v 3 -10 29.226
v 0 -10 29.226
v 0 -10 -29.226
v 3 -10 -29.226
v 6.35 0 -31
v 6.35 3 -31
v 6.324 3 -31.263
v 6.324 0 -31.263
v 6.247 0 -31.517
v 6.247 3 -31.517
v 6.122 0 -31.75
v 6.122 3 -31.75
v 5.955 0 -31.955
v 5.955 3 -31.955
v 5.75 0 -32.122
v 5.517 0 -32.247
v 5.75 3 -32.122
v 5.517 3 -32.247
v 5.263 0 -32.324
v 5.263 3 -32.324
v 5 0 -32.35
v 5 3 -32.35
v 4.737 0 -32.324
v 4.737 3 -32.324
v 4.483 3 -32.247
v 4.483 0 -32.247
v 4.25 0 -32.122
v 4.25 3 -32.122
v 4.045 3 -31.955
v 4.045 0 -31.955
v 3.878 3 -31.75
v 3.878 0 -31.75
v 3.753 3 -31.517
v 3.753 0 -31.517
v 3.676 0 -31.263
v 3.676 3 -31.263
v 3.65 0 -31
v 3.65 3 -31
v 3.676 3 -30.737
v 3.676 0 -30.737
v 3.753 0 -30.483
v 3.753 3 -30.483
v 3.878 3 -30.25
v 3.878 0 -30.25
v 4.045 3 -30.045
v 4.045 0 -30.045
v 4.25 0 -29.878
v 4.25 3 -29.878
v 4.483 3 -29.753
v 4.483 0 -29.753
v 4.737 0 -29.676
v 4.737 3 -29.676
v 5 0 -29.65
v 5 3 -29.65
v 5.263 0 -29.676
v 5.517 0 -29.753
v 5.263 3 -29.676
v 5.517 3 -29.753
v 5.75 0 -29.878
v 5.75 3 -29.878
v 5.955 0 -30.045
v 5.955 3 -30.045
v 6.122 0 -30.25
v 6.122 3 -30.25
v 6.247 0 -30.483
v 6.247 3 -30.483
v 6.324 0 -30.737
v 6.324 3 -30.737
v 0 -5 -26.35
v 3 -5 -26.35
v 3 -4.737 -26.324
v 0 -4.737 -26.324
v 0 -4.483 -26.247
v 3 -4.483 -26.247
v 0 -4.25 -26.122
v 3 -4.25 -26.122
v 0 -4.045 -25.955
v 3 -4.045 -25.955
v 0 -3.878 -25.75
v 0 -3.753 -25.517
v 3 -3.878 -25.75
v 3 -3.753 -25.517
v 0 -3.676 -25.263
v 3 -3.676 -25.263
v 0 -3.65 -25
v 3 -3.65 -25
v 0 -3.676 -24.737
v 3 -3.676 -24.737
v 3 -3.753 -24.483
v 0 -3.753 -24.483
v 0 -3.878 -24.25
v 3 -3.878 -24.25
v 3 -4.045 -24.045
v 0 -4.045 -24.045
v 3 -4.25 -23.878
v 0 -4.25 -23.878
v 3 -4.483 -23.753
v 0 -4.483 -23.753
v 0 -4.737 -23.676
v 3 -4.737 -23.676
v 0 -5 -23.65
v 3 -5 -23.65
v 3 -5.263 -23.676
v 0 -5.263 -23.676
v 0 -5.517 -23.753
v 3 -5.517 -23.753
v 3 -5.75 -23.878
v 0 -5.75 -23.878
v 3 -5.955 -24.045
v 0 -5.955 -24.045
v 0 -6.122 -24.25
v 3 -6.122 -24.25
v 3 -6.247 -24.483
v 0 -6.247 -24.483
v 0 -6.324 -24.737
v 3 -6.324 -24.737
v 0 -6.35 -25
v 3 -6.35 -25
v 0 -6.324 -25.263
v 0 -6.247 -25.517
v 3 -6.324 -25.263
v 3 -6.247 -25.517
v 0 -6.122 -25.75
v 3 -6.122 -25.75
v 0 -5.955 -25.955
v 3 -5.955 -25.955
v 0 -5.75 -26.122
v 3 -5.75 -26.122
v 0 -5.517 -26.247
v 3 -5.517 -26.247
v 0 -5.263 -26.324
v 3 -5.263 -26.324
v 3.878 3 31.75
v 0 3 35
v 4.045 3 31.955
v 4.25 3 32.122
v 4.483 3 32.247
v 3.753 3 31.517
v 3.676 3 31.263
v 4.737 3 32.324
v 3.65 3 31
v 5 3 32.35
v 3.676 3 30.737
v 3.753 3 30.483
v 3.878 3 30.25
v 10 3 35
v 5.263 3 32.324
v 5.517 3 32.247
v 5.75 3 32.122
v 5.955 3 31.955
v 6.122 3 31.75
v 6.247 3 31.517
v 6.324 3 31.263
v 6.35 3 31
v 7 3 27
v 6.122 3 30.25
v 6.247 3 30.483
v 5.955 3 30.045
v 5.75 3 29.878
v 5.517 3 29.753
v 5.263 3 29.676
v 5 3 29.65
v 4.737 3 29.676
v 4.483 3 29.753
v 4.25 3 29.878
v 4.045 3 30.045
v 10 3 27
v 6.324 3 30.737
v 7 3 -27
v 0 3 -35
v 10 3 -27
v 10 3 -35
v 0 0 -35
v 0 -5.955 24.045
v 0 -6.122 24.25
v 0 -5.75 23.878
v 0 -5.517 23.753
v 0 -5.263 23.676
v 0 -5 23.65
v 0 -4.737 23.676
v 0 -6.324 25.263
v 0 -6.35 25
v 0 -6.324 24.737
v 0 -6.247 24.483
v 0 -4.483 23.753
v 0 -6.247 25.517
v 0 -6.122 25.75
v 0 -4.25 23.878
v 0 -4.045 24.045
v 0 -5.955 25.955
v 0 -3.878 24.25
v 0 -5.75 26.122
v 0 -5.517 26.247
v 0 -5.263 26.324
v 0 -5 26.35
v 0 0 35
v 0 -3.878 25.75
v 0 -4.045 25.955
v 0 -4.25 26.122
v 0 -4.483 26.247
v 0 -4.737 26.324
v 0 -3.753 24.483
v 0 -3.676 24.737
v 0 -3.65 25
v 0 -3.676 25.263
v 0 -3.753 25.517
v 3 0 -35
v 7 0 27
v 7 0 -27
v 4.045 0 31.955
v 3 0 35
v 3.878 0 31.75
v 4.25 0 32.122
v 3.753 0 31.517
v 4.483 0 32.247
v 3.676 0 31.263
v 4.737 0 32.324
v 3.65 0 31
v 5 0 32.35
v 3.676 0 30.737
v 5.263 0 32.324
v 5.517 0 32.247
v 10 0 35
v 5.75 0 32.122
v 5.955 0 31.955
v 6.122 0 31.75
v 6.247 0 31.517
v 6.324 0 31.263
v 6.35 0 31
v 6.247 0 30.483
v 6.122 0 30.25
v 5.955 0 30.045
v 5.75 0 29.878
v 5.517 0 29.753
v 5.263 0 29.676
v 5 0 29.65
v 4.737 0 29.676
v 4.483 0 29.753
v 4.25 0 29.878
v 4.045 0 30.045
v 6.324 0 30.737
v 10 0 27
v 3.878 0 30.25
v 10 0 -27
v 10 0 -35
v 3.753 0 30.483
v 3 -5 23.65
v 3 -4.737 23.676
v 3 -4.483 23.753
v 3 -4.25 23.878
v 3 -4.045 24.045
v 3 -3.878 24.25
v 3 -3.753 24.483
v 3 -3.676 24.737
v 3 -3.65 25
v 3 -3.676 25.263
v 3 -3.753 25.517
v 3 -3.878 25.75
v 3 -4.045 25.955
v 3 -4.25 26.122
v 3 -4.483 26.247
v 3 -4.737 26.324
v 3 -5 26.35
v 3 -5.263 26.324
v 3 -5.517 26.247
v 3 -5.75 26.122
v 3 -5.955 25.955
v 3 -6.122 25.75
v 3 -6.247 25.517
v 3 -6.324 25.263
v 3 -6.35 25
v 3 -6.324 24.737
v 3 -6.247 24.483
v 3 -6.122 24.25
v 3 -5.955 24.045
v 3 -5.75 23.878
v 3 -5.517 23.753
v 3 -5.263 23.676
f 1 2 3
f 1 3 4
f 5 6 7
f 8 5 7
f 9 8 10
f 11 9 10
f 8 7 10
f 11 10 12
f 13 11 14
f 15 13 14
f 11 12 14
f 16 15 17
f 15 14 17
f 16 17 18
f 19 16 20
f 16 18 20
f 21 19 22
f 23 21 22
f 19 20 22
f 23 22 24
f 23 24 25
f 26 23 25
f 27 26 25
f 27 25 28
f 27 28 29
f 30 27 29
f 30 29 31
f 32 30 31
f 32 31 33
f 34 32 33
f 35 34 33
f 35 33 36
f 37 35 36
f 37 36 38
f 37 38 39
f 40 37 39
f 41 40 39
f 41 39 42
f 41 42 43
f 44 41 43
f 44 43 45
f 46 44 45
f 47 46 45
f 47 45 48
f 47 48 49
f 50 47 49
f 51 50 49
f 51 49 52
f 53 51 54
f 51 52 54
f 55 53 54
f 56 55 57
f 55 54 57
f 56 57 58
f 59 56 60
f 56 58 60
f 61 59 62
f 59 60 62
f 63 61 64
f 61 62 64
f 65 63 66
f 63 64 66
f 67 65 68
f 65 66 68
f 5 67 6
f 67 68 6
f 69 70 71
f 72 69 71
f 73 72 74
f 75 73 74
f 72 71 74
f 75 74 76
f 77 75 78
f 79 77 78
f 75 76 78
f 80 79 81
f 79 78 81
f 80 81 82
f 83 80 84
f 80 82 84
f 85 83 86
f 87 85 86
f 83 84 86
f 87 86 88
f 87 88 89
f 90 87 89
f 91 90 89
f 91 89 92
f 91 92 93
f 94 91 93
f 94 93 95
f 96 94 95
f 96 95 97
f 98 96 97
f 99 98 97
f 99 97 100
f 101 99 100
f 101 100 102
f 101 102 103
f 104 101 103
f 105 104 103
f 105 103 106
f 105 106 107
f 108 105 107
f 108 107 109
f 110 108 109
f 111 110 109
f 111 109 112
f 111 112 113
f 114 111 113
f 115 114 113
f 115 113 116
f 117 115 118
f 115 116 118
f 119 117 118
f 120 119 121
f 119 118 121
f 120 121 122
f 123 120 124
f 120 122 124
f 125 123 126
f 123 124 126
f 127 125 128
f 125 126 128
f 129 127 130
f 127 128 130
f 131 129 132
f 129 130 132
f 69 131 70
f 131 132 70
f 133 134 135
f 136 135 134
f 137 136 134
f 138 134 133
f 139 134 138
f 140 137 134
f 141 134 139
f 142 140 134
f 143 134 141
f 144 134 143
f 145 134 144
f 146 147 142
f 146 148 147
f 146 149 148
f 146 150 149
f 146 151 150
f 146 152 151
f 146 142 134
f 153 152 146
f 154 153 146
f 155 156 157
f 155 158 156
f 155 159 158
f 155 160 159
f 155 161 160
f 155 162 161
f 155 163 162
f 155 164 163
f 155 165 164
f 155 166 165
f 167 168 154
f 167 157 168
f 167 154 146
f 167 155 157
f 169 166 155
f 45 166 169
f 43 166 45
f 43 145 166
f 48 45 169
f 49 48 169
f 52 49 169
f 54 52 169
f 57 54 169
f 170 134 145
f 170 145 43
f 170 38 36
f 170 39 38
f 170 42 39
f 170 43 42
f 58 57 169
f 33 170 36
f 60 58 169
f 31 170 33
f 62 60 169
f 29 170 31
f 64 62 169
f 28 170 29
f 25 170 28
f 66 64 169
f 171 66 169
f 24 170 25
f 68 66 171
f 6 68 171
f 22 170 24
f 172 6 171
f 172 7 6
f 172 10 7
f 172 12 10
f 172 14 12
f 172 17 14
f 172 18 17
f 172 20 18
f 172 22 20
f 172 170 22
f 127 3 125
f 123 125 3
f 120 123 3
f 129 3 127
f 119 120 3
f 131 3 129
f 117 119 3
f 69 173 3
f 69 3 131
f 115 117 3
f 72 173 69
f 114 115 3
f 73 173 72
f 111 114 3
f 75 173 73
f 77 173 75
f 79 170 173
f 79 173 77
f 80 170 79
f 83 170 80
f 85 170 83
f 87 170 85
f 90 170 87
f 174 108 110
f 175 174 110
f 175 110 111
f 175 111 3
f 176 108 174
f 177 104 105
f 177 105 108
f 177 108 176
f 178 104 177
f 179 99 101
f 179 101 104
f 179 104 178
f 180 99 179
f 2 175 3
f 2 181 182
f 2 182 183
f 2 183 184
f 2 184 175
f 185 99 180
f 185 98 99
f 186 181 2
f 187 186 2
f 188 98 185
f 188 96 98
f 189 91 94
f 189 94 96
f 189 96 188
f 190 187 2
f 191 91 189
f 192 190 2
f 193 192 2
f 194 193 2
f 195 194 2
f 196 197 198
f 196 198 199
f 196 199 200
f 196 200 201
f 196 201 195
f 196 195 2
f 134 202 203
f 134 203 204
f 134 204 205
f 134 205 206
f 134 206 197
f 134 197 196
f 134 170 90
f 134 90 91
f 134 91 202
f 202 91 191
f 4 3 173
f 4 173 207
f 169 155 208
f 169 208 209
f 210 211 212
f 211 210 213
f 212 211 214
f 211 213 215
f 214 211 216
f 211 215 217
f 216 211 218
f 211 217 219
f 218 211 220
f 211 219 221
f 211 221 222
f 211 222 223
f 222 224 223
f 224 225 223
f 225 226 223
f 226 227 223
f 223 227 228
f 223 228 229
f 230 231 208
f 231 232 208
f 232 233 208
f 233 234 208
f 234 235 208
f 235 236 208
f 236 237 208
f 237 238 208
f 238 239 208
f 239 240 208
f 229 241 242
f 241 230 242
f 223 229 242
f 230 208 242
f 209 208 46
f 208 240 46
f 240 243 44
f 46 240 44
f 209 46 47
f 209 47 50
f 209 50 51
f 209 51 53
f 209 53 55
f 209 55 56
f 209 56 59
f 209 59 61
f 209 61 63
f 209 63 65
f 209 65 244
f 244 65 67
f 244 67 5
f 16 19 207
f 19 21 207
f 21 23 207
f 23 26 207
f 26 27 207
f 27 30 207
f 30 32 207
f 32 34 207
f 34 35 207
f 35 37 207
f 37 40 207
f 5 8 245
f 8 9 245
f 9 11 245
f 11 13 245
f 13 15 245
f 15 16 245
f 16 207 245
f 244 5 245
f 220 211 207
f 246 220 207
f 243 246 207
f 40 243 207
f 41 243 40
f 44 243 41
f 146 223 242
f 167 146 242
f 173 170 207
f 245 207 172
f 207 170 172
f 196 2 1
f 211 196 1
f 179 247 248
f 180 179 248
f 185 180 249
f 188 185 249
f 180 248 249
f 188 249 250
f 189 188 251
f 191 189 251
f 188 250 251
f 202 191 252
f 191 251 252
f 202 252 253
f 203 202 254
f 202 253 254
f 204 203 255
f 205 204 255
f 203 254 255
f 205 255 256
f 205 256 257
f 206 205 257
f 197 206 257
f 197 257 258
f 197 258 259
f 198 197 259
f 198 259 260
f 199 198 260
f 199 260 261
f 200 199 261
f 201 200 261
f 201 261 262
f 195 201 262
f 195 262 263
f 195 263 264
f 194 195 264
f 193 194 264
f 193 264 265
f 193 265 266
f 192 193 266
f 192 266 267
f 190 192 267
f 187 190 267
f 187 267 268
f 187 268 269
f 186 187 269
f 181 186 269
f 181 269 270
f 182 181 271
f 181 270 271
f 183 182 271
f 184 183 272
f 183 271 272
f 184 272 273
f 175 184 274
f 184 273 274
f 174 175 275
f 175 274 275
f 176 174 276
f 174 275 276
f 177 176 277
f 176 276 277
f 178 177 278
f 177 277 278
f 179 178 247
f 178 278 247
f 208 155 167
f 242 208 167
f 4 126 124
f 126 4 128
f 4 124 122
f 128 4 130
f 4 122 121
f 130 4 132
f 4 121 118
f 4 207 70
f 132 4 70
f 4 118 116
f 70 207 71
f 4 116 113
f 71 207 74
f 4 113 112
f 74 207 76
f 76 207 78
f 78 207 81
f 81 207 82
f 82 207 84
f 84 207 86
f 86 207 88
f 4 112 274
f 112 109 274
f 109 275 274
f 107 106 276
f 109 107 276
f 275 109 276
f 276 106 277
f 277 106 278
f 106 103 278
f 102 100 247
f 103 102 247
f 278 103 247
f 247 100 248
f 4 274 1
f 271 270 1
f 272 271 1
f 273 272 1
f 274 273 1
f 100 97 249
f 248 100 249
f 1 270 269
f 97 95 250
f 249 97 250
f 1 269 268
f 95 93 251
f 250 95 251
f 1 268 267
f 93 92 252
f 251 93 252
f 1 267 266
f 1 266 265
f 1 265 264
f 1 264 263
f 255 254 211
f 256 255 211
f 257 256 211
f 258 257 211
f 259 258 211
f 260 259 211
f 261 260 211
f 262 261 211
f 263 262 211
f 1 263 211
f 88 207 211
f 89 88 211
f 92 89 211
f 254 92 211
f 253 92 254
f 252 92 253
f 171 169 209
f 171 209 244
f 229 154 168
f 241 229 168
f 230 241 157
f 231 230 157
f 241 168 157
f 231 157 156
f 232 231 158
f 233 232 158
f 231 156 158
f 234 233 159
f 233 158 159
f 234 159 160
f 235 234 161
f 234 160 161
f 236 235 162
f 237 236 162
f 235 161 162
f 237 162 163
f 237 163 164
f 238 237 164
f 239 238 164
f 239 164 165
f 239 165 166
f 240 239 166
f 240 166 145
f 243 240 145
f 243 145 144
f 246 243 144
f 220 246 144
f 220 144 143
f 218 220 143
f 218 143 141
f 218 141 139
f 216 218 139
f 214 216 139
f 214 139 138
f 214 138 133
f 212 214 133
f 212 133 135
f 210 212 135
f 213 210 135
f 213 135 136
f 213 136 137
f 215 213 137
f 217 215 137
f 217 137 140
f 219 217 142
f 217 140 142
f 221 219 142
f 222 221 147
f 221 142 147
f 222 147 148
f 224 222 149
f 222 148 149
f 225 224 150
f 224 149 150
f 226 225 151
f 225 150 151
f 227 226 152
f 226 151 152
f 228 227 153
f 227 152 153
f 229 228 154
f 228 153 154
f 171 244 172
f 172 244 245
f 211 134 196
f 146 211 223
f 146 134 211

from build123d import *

# Parameters (mm, degrees)
SKETCH1_W               = 10
SKETCH1_H               = 70
BOSS_EXTRUDE1_DEPTH     = 3
SKETCH2_W               = 3
SKETCH2_H               = 70
BOSS_EXTRUDE2_DEPTH     = 10
SKETCH3_R               = 1.35
CUT_EXTRUDE1_DEPTH      = 1
CUT_EXTRUDE1_DEPTH_BACK = 14
SKETCH4_R               = 1.35
CUT_EXTRUDE2_DEPTH      = 10
CHAMFER1_SIZE           = 10
CHAMFER1_SIZE2          = 5.773502692
CHAMFER1_PART_2_SIZE    = 10
CHAMFER1_PART_2_SIZE2   = 5.773502692
SKETCH5_W               = 3
SKETCH5_H               = 54
CUT_EXTRUDE3_DEPTH      = 10


with BuildPart() as part:
    # Sketch1 → Boss-Extrude1 (new body)
    with BuildSketch(Plane(origin=(0, 0, 0), x_dir=(1, 0, 0), z_dir=(0, 1, 0))):
        with Locations((5, 0)):
            Rectangle(SKETCH1_W, SKETCH1_H)
    extrude(amount=BOSS_EXTRUDE1_DEPTH)

    # Sketch2 → Boss-Extrude2 (add)
    with BuildSketch(Plane.XZ):
        with Locations((1.5, 0)):
            Rectangle(SKETCH2_W, SKETCH2_H)
    extrude(amount=BOSS_EXTRUDE2_DEPTH)

    # Sketch3 → Cut-Extrude1 (cut, two sides)
    with BuildSketch(Plane(origin=(0, 3, 0), x_dir=(1, 0, 0), z_dir=(0, 1, 0))) as cut_extrude1_sk:
        with Locations((5, 31)):
            Circle(SKETCH3_R)
        with Locations((5, -31)):
            Circle(SKETCH3_R)
    extrude(amount=CUT_EXTRUDE1_DEPTH, mode=Mode.SUBTRACT)
    extrude(cut_extrude1_sk.sketch, amount=-CUT_EXTRUDE1_DEPTH_BACK, mode=Mode.SUBTRACT)

    # Sketch4 → Cut-Extrude2 (cut)
    with BuildSketch(Plane(origin=(3, 0, 0), x_dir=(0, 0, -1), z_dir=(1, 0, 0))):
        with Locations((25, -5)):
            Circle(SKETCH4_R)
        with Locations((-25, -5)):
            Circle(SKETCH4_R)
    extrude(amount=-CUT_EXTRUDE2_DEPTH, mode=Mode.SUBTRACT)

    # Chamfer1
    chamfer1_edges = [part.edges().sort_by_distance(p)[0] for p in [
        (1.5, -10, -35),
    ]]
    chamfer1_side = [part.faces().sort_by_distance(p)[0] for p in [
        (9.835987805, 1.5, -35),
    ]]
    chamfer(chamfer1_edges, length=CHAMFER1_SIZE, length2=CHAMFER1_SIZE2, reference=chamfer1_side[0])

    # Chamfer1 part 2
    chamfer1_part_2_edges = [part.edges().sort_by_distance(p)[0] for p in [
        (1.5, -10, 35),
    ]]
    chamfer1_part_2_side = [part.faces().sort_by_distance(p)[0] for p in [
        (0.164012195, -3.5, 35),
    ]]
    chamfer(chamfer1_part_2_edges, length=CHAMFER1_PART_2_SIZE, length2=CHAMFER1_PART_2_SIZE2, reference=chamfer1_part_2_side[0])

    # Sketch5 → Cut-Extrude3 (cut)
    with BuildSketch(Plane(origin=(0, 3, 0), x_dir=(1, 0, 0), z_dir=(0, 1, 0))):
        with Locations((8.5, 0)):
            Rectangle(SKETCH5_W, SKETCH5_H)
    extrude(amount=-CUT_EXTRUDE3_DEPTH, mode=Mode.SUBTRACT)


solid = part.part
